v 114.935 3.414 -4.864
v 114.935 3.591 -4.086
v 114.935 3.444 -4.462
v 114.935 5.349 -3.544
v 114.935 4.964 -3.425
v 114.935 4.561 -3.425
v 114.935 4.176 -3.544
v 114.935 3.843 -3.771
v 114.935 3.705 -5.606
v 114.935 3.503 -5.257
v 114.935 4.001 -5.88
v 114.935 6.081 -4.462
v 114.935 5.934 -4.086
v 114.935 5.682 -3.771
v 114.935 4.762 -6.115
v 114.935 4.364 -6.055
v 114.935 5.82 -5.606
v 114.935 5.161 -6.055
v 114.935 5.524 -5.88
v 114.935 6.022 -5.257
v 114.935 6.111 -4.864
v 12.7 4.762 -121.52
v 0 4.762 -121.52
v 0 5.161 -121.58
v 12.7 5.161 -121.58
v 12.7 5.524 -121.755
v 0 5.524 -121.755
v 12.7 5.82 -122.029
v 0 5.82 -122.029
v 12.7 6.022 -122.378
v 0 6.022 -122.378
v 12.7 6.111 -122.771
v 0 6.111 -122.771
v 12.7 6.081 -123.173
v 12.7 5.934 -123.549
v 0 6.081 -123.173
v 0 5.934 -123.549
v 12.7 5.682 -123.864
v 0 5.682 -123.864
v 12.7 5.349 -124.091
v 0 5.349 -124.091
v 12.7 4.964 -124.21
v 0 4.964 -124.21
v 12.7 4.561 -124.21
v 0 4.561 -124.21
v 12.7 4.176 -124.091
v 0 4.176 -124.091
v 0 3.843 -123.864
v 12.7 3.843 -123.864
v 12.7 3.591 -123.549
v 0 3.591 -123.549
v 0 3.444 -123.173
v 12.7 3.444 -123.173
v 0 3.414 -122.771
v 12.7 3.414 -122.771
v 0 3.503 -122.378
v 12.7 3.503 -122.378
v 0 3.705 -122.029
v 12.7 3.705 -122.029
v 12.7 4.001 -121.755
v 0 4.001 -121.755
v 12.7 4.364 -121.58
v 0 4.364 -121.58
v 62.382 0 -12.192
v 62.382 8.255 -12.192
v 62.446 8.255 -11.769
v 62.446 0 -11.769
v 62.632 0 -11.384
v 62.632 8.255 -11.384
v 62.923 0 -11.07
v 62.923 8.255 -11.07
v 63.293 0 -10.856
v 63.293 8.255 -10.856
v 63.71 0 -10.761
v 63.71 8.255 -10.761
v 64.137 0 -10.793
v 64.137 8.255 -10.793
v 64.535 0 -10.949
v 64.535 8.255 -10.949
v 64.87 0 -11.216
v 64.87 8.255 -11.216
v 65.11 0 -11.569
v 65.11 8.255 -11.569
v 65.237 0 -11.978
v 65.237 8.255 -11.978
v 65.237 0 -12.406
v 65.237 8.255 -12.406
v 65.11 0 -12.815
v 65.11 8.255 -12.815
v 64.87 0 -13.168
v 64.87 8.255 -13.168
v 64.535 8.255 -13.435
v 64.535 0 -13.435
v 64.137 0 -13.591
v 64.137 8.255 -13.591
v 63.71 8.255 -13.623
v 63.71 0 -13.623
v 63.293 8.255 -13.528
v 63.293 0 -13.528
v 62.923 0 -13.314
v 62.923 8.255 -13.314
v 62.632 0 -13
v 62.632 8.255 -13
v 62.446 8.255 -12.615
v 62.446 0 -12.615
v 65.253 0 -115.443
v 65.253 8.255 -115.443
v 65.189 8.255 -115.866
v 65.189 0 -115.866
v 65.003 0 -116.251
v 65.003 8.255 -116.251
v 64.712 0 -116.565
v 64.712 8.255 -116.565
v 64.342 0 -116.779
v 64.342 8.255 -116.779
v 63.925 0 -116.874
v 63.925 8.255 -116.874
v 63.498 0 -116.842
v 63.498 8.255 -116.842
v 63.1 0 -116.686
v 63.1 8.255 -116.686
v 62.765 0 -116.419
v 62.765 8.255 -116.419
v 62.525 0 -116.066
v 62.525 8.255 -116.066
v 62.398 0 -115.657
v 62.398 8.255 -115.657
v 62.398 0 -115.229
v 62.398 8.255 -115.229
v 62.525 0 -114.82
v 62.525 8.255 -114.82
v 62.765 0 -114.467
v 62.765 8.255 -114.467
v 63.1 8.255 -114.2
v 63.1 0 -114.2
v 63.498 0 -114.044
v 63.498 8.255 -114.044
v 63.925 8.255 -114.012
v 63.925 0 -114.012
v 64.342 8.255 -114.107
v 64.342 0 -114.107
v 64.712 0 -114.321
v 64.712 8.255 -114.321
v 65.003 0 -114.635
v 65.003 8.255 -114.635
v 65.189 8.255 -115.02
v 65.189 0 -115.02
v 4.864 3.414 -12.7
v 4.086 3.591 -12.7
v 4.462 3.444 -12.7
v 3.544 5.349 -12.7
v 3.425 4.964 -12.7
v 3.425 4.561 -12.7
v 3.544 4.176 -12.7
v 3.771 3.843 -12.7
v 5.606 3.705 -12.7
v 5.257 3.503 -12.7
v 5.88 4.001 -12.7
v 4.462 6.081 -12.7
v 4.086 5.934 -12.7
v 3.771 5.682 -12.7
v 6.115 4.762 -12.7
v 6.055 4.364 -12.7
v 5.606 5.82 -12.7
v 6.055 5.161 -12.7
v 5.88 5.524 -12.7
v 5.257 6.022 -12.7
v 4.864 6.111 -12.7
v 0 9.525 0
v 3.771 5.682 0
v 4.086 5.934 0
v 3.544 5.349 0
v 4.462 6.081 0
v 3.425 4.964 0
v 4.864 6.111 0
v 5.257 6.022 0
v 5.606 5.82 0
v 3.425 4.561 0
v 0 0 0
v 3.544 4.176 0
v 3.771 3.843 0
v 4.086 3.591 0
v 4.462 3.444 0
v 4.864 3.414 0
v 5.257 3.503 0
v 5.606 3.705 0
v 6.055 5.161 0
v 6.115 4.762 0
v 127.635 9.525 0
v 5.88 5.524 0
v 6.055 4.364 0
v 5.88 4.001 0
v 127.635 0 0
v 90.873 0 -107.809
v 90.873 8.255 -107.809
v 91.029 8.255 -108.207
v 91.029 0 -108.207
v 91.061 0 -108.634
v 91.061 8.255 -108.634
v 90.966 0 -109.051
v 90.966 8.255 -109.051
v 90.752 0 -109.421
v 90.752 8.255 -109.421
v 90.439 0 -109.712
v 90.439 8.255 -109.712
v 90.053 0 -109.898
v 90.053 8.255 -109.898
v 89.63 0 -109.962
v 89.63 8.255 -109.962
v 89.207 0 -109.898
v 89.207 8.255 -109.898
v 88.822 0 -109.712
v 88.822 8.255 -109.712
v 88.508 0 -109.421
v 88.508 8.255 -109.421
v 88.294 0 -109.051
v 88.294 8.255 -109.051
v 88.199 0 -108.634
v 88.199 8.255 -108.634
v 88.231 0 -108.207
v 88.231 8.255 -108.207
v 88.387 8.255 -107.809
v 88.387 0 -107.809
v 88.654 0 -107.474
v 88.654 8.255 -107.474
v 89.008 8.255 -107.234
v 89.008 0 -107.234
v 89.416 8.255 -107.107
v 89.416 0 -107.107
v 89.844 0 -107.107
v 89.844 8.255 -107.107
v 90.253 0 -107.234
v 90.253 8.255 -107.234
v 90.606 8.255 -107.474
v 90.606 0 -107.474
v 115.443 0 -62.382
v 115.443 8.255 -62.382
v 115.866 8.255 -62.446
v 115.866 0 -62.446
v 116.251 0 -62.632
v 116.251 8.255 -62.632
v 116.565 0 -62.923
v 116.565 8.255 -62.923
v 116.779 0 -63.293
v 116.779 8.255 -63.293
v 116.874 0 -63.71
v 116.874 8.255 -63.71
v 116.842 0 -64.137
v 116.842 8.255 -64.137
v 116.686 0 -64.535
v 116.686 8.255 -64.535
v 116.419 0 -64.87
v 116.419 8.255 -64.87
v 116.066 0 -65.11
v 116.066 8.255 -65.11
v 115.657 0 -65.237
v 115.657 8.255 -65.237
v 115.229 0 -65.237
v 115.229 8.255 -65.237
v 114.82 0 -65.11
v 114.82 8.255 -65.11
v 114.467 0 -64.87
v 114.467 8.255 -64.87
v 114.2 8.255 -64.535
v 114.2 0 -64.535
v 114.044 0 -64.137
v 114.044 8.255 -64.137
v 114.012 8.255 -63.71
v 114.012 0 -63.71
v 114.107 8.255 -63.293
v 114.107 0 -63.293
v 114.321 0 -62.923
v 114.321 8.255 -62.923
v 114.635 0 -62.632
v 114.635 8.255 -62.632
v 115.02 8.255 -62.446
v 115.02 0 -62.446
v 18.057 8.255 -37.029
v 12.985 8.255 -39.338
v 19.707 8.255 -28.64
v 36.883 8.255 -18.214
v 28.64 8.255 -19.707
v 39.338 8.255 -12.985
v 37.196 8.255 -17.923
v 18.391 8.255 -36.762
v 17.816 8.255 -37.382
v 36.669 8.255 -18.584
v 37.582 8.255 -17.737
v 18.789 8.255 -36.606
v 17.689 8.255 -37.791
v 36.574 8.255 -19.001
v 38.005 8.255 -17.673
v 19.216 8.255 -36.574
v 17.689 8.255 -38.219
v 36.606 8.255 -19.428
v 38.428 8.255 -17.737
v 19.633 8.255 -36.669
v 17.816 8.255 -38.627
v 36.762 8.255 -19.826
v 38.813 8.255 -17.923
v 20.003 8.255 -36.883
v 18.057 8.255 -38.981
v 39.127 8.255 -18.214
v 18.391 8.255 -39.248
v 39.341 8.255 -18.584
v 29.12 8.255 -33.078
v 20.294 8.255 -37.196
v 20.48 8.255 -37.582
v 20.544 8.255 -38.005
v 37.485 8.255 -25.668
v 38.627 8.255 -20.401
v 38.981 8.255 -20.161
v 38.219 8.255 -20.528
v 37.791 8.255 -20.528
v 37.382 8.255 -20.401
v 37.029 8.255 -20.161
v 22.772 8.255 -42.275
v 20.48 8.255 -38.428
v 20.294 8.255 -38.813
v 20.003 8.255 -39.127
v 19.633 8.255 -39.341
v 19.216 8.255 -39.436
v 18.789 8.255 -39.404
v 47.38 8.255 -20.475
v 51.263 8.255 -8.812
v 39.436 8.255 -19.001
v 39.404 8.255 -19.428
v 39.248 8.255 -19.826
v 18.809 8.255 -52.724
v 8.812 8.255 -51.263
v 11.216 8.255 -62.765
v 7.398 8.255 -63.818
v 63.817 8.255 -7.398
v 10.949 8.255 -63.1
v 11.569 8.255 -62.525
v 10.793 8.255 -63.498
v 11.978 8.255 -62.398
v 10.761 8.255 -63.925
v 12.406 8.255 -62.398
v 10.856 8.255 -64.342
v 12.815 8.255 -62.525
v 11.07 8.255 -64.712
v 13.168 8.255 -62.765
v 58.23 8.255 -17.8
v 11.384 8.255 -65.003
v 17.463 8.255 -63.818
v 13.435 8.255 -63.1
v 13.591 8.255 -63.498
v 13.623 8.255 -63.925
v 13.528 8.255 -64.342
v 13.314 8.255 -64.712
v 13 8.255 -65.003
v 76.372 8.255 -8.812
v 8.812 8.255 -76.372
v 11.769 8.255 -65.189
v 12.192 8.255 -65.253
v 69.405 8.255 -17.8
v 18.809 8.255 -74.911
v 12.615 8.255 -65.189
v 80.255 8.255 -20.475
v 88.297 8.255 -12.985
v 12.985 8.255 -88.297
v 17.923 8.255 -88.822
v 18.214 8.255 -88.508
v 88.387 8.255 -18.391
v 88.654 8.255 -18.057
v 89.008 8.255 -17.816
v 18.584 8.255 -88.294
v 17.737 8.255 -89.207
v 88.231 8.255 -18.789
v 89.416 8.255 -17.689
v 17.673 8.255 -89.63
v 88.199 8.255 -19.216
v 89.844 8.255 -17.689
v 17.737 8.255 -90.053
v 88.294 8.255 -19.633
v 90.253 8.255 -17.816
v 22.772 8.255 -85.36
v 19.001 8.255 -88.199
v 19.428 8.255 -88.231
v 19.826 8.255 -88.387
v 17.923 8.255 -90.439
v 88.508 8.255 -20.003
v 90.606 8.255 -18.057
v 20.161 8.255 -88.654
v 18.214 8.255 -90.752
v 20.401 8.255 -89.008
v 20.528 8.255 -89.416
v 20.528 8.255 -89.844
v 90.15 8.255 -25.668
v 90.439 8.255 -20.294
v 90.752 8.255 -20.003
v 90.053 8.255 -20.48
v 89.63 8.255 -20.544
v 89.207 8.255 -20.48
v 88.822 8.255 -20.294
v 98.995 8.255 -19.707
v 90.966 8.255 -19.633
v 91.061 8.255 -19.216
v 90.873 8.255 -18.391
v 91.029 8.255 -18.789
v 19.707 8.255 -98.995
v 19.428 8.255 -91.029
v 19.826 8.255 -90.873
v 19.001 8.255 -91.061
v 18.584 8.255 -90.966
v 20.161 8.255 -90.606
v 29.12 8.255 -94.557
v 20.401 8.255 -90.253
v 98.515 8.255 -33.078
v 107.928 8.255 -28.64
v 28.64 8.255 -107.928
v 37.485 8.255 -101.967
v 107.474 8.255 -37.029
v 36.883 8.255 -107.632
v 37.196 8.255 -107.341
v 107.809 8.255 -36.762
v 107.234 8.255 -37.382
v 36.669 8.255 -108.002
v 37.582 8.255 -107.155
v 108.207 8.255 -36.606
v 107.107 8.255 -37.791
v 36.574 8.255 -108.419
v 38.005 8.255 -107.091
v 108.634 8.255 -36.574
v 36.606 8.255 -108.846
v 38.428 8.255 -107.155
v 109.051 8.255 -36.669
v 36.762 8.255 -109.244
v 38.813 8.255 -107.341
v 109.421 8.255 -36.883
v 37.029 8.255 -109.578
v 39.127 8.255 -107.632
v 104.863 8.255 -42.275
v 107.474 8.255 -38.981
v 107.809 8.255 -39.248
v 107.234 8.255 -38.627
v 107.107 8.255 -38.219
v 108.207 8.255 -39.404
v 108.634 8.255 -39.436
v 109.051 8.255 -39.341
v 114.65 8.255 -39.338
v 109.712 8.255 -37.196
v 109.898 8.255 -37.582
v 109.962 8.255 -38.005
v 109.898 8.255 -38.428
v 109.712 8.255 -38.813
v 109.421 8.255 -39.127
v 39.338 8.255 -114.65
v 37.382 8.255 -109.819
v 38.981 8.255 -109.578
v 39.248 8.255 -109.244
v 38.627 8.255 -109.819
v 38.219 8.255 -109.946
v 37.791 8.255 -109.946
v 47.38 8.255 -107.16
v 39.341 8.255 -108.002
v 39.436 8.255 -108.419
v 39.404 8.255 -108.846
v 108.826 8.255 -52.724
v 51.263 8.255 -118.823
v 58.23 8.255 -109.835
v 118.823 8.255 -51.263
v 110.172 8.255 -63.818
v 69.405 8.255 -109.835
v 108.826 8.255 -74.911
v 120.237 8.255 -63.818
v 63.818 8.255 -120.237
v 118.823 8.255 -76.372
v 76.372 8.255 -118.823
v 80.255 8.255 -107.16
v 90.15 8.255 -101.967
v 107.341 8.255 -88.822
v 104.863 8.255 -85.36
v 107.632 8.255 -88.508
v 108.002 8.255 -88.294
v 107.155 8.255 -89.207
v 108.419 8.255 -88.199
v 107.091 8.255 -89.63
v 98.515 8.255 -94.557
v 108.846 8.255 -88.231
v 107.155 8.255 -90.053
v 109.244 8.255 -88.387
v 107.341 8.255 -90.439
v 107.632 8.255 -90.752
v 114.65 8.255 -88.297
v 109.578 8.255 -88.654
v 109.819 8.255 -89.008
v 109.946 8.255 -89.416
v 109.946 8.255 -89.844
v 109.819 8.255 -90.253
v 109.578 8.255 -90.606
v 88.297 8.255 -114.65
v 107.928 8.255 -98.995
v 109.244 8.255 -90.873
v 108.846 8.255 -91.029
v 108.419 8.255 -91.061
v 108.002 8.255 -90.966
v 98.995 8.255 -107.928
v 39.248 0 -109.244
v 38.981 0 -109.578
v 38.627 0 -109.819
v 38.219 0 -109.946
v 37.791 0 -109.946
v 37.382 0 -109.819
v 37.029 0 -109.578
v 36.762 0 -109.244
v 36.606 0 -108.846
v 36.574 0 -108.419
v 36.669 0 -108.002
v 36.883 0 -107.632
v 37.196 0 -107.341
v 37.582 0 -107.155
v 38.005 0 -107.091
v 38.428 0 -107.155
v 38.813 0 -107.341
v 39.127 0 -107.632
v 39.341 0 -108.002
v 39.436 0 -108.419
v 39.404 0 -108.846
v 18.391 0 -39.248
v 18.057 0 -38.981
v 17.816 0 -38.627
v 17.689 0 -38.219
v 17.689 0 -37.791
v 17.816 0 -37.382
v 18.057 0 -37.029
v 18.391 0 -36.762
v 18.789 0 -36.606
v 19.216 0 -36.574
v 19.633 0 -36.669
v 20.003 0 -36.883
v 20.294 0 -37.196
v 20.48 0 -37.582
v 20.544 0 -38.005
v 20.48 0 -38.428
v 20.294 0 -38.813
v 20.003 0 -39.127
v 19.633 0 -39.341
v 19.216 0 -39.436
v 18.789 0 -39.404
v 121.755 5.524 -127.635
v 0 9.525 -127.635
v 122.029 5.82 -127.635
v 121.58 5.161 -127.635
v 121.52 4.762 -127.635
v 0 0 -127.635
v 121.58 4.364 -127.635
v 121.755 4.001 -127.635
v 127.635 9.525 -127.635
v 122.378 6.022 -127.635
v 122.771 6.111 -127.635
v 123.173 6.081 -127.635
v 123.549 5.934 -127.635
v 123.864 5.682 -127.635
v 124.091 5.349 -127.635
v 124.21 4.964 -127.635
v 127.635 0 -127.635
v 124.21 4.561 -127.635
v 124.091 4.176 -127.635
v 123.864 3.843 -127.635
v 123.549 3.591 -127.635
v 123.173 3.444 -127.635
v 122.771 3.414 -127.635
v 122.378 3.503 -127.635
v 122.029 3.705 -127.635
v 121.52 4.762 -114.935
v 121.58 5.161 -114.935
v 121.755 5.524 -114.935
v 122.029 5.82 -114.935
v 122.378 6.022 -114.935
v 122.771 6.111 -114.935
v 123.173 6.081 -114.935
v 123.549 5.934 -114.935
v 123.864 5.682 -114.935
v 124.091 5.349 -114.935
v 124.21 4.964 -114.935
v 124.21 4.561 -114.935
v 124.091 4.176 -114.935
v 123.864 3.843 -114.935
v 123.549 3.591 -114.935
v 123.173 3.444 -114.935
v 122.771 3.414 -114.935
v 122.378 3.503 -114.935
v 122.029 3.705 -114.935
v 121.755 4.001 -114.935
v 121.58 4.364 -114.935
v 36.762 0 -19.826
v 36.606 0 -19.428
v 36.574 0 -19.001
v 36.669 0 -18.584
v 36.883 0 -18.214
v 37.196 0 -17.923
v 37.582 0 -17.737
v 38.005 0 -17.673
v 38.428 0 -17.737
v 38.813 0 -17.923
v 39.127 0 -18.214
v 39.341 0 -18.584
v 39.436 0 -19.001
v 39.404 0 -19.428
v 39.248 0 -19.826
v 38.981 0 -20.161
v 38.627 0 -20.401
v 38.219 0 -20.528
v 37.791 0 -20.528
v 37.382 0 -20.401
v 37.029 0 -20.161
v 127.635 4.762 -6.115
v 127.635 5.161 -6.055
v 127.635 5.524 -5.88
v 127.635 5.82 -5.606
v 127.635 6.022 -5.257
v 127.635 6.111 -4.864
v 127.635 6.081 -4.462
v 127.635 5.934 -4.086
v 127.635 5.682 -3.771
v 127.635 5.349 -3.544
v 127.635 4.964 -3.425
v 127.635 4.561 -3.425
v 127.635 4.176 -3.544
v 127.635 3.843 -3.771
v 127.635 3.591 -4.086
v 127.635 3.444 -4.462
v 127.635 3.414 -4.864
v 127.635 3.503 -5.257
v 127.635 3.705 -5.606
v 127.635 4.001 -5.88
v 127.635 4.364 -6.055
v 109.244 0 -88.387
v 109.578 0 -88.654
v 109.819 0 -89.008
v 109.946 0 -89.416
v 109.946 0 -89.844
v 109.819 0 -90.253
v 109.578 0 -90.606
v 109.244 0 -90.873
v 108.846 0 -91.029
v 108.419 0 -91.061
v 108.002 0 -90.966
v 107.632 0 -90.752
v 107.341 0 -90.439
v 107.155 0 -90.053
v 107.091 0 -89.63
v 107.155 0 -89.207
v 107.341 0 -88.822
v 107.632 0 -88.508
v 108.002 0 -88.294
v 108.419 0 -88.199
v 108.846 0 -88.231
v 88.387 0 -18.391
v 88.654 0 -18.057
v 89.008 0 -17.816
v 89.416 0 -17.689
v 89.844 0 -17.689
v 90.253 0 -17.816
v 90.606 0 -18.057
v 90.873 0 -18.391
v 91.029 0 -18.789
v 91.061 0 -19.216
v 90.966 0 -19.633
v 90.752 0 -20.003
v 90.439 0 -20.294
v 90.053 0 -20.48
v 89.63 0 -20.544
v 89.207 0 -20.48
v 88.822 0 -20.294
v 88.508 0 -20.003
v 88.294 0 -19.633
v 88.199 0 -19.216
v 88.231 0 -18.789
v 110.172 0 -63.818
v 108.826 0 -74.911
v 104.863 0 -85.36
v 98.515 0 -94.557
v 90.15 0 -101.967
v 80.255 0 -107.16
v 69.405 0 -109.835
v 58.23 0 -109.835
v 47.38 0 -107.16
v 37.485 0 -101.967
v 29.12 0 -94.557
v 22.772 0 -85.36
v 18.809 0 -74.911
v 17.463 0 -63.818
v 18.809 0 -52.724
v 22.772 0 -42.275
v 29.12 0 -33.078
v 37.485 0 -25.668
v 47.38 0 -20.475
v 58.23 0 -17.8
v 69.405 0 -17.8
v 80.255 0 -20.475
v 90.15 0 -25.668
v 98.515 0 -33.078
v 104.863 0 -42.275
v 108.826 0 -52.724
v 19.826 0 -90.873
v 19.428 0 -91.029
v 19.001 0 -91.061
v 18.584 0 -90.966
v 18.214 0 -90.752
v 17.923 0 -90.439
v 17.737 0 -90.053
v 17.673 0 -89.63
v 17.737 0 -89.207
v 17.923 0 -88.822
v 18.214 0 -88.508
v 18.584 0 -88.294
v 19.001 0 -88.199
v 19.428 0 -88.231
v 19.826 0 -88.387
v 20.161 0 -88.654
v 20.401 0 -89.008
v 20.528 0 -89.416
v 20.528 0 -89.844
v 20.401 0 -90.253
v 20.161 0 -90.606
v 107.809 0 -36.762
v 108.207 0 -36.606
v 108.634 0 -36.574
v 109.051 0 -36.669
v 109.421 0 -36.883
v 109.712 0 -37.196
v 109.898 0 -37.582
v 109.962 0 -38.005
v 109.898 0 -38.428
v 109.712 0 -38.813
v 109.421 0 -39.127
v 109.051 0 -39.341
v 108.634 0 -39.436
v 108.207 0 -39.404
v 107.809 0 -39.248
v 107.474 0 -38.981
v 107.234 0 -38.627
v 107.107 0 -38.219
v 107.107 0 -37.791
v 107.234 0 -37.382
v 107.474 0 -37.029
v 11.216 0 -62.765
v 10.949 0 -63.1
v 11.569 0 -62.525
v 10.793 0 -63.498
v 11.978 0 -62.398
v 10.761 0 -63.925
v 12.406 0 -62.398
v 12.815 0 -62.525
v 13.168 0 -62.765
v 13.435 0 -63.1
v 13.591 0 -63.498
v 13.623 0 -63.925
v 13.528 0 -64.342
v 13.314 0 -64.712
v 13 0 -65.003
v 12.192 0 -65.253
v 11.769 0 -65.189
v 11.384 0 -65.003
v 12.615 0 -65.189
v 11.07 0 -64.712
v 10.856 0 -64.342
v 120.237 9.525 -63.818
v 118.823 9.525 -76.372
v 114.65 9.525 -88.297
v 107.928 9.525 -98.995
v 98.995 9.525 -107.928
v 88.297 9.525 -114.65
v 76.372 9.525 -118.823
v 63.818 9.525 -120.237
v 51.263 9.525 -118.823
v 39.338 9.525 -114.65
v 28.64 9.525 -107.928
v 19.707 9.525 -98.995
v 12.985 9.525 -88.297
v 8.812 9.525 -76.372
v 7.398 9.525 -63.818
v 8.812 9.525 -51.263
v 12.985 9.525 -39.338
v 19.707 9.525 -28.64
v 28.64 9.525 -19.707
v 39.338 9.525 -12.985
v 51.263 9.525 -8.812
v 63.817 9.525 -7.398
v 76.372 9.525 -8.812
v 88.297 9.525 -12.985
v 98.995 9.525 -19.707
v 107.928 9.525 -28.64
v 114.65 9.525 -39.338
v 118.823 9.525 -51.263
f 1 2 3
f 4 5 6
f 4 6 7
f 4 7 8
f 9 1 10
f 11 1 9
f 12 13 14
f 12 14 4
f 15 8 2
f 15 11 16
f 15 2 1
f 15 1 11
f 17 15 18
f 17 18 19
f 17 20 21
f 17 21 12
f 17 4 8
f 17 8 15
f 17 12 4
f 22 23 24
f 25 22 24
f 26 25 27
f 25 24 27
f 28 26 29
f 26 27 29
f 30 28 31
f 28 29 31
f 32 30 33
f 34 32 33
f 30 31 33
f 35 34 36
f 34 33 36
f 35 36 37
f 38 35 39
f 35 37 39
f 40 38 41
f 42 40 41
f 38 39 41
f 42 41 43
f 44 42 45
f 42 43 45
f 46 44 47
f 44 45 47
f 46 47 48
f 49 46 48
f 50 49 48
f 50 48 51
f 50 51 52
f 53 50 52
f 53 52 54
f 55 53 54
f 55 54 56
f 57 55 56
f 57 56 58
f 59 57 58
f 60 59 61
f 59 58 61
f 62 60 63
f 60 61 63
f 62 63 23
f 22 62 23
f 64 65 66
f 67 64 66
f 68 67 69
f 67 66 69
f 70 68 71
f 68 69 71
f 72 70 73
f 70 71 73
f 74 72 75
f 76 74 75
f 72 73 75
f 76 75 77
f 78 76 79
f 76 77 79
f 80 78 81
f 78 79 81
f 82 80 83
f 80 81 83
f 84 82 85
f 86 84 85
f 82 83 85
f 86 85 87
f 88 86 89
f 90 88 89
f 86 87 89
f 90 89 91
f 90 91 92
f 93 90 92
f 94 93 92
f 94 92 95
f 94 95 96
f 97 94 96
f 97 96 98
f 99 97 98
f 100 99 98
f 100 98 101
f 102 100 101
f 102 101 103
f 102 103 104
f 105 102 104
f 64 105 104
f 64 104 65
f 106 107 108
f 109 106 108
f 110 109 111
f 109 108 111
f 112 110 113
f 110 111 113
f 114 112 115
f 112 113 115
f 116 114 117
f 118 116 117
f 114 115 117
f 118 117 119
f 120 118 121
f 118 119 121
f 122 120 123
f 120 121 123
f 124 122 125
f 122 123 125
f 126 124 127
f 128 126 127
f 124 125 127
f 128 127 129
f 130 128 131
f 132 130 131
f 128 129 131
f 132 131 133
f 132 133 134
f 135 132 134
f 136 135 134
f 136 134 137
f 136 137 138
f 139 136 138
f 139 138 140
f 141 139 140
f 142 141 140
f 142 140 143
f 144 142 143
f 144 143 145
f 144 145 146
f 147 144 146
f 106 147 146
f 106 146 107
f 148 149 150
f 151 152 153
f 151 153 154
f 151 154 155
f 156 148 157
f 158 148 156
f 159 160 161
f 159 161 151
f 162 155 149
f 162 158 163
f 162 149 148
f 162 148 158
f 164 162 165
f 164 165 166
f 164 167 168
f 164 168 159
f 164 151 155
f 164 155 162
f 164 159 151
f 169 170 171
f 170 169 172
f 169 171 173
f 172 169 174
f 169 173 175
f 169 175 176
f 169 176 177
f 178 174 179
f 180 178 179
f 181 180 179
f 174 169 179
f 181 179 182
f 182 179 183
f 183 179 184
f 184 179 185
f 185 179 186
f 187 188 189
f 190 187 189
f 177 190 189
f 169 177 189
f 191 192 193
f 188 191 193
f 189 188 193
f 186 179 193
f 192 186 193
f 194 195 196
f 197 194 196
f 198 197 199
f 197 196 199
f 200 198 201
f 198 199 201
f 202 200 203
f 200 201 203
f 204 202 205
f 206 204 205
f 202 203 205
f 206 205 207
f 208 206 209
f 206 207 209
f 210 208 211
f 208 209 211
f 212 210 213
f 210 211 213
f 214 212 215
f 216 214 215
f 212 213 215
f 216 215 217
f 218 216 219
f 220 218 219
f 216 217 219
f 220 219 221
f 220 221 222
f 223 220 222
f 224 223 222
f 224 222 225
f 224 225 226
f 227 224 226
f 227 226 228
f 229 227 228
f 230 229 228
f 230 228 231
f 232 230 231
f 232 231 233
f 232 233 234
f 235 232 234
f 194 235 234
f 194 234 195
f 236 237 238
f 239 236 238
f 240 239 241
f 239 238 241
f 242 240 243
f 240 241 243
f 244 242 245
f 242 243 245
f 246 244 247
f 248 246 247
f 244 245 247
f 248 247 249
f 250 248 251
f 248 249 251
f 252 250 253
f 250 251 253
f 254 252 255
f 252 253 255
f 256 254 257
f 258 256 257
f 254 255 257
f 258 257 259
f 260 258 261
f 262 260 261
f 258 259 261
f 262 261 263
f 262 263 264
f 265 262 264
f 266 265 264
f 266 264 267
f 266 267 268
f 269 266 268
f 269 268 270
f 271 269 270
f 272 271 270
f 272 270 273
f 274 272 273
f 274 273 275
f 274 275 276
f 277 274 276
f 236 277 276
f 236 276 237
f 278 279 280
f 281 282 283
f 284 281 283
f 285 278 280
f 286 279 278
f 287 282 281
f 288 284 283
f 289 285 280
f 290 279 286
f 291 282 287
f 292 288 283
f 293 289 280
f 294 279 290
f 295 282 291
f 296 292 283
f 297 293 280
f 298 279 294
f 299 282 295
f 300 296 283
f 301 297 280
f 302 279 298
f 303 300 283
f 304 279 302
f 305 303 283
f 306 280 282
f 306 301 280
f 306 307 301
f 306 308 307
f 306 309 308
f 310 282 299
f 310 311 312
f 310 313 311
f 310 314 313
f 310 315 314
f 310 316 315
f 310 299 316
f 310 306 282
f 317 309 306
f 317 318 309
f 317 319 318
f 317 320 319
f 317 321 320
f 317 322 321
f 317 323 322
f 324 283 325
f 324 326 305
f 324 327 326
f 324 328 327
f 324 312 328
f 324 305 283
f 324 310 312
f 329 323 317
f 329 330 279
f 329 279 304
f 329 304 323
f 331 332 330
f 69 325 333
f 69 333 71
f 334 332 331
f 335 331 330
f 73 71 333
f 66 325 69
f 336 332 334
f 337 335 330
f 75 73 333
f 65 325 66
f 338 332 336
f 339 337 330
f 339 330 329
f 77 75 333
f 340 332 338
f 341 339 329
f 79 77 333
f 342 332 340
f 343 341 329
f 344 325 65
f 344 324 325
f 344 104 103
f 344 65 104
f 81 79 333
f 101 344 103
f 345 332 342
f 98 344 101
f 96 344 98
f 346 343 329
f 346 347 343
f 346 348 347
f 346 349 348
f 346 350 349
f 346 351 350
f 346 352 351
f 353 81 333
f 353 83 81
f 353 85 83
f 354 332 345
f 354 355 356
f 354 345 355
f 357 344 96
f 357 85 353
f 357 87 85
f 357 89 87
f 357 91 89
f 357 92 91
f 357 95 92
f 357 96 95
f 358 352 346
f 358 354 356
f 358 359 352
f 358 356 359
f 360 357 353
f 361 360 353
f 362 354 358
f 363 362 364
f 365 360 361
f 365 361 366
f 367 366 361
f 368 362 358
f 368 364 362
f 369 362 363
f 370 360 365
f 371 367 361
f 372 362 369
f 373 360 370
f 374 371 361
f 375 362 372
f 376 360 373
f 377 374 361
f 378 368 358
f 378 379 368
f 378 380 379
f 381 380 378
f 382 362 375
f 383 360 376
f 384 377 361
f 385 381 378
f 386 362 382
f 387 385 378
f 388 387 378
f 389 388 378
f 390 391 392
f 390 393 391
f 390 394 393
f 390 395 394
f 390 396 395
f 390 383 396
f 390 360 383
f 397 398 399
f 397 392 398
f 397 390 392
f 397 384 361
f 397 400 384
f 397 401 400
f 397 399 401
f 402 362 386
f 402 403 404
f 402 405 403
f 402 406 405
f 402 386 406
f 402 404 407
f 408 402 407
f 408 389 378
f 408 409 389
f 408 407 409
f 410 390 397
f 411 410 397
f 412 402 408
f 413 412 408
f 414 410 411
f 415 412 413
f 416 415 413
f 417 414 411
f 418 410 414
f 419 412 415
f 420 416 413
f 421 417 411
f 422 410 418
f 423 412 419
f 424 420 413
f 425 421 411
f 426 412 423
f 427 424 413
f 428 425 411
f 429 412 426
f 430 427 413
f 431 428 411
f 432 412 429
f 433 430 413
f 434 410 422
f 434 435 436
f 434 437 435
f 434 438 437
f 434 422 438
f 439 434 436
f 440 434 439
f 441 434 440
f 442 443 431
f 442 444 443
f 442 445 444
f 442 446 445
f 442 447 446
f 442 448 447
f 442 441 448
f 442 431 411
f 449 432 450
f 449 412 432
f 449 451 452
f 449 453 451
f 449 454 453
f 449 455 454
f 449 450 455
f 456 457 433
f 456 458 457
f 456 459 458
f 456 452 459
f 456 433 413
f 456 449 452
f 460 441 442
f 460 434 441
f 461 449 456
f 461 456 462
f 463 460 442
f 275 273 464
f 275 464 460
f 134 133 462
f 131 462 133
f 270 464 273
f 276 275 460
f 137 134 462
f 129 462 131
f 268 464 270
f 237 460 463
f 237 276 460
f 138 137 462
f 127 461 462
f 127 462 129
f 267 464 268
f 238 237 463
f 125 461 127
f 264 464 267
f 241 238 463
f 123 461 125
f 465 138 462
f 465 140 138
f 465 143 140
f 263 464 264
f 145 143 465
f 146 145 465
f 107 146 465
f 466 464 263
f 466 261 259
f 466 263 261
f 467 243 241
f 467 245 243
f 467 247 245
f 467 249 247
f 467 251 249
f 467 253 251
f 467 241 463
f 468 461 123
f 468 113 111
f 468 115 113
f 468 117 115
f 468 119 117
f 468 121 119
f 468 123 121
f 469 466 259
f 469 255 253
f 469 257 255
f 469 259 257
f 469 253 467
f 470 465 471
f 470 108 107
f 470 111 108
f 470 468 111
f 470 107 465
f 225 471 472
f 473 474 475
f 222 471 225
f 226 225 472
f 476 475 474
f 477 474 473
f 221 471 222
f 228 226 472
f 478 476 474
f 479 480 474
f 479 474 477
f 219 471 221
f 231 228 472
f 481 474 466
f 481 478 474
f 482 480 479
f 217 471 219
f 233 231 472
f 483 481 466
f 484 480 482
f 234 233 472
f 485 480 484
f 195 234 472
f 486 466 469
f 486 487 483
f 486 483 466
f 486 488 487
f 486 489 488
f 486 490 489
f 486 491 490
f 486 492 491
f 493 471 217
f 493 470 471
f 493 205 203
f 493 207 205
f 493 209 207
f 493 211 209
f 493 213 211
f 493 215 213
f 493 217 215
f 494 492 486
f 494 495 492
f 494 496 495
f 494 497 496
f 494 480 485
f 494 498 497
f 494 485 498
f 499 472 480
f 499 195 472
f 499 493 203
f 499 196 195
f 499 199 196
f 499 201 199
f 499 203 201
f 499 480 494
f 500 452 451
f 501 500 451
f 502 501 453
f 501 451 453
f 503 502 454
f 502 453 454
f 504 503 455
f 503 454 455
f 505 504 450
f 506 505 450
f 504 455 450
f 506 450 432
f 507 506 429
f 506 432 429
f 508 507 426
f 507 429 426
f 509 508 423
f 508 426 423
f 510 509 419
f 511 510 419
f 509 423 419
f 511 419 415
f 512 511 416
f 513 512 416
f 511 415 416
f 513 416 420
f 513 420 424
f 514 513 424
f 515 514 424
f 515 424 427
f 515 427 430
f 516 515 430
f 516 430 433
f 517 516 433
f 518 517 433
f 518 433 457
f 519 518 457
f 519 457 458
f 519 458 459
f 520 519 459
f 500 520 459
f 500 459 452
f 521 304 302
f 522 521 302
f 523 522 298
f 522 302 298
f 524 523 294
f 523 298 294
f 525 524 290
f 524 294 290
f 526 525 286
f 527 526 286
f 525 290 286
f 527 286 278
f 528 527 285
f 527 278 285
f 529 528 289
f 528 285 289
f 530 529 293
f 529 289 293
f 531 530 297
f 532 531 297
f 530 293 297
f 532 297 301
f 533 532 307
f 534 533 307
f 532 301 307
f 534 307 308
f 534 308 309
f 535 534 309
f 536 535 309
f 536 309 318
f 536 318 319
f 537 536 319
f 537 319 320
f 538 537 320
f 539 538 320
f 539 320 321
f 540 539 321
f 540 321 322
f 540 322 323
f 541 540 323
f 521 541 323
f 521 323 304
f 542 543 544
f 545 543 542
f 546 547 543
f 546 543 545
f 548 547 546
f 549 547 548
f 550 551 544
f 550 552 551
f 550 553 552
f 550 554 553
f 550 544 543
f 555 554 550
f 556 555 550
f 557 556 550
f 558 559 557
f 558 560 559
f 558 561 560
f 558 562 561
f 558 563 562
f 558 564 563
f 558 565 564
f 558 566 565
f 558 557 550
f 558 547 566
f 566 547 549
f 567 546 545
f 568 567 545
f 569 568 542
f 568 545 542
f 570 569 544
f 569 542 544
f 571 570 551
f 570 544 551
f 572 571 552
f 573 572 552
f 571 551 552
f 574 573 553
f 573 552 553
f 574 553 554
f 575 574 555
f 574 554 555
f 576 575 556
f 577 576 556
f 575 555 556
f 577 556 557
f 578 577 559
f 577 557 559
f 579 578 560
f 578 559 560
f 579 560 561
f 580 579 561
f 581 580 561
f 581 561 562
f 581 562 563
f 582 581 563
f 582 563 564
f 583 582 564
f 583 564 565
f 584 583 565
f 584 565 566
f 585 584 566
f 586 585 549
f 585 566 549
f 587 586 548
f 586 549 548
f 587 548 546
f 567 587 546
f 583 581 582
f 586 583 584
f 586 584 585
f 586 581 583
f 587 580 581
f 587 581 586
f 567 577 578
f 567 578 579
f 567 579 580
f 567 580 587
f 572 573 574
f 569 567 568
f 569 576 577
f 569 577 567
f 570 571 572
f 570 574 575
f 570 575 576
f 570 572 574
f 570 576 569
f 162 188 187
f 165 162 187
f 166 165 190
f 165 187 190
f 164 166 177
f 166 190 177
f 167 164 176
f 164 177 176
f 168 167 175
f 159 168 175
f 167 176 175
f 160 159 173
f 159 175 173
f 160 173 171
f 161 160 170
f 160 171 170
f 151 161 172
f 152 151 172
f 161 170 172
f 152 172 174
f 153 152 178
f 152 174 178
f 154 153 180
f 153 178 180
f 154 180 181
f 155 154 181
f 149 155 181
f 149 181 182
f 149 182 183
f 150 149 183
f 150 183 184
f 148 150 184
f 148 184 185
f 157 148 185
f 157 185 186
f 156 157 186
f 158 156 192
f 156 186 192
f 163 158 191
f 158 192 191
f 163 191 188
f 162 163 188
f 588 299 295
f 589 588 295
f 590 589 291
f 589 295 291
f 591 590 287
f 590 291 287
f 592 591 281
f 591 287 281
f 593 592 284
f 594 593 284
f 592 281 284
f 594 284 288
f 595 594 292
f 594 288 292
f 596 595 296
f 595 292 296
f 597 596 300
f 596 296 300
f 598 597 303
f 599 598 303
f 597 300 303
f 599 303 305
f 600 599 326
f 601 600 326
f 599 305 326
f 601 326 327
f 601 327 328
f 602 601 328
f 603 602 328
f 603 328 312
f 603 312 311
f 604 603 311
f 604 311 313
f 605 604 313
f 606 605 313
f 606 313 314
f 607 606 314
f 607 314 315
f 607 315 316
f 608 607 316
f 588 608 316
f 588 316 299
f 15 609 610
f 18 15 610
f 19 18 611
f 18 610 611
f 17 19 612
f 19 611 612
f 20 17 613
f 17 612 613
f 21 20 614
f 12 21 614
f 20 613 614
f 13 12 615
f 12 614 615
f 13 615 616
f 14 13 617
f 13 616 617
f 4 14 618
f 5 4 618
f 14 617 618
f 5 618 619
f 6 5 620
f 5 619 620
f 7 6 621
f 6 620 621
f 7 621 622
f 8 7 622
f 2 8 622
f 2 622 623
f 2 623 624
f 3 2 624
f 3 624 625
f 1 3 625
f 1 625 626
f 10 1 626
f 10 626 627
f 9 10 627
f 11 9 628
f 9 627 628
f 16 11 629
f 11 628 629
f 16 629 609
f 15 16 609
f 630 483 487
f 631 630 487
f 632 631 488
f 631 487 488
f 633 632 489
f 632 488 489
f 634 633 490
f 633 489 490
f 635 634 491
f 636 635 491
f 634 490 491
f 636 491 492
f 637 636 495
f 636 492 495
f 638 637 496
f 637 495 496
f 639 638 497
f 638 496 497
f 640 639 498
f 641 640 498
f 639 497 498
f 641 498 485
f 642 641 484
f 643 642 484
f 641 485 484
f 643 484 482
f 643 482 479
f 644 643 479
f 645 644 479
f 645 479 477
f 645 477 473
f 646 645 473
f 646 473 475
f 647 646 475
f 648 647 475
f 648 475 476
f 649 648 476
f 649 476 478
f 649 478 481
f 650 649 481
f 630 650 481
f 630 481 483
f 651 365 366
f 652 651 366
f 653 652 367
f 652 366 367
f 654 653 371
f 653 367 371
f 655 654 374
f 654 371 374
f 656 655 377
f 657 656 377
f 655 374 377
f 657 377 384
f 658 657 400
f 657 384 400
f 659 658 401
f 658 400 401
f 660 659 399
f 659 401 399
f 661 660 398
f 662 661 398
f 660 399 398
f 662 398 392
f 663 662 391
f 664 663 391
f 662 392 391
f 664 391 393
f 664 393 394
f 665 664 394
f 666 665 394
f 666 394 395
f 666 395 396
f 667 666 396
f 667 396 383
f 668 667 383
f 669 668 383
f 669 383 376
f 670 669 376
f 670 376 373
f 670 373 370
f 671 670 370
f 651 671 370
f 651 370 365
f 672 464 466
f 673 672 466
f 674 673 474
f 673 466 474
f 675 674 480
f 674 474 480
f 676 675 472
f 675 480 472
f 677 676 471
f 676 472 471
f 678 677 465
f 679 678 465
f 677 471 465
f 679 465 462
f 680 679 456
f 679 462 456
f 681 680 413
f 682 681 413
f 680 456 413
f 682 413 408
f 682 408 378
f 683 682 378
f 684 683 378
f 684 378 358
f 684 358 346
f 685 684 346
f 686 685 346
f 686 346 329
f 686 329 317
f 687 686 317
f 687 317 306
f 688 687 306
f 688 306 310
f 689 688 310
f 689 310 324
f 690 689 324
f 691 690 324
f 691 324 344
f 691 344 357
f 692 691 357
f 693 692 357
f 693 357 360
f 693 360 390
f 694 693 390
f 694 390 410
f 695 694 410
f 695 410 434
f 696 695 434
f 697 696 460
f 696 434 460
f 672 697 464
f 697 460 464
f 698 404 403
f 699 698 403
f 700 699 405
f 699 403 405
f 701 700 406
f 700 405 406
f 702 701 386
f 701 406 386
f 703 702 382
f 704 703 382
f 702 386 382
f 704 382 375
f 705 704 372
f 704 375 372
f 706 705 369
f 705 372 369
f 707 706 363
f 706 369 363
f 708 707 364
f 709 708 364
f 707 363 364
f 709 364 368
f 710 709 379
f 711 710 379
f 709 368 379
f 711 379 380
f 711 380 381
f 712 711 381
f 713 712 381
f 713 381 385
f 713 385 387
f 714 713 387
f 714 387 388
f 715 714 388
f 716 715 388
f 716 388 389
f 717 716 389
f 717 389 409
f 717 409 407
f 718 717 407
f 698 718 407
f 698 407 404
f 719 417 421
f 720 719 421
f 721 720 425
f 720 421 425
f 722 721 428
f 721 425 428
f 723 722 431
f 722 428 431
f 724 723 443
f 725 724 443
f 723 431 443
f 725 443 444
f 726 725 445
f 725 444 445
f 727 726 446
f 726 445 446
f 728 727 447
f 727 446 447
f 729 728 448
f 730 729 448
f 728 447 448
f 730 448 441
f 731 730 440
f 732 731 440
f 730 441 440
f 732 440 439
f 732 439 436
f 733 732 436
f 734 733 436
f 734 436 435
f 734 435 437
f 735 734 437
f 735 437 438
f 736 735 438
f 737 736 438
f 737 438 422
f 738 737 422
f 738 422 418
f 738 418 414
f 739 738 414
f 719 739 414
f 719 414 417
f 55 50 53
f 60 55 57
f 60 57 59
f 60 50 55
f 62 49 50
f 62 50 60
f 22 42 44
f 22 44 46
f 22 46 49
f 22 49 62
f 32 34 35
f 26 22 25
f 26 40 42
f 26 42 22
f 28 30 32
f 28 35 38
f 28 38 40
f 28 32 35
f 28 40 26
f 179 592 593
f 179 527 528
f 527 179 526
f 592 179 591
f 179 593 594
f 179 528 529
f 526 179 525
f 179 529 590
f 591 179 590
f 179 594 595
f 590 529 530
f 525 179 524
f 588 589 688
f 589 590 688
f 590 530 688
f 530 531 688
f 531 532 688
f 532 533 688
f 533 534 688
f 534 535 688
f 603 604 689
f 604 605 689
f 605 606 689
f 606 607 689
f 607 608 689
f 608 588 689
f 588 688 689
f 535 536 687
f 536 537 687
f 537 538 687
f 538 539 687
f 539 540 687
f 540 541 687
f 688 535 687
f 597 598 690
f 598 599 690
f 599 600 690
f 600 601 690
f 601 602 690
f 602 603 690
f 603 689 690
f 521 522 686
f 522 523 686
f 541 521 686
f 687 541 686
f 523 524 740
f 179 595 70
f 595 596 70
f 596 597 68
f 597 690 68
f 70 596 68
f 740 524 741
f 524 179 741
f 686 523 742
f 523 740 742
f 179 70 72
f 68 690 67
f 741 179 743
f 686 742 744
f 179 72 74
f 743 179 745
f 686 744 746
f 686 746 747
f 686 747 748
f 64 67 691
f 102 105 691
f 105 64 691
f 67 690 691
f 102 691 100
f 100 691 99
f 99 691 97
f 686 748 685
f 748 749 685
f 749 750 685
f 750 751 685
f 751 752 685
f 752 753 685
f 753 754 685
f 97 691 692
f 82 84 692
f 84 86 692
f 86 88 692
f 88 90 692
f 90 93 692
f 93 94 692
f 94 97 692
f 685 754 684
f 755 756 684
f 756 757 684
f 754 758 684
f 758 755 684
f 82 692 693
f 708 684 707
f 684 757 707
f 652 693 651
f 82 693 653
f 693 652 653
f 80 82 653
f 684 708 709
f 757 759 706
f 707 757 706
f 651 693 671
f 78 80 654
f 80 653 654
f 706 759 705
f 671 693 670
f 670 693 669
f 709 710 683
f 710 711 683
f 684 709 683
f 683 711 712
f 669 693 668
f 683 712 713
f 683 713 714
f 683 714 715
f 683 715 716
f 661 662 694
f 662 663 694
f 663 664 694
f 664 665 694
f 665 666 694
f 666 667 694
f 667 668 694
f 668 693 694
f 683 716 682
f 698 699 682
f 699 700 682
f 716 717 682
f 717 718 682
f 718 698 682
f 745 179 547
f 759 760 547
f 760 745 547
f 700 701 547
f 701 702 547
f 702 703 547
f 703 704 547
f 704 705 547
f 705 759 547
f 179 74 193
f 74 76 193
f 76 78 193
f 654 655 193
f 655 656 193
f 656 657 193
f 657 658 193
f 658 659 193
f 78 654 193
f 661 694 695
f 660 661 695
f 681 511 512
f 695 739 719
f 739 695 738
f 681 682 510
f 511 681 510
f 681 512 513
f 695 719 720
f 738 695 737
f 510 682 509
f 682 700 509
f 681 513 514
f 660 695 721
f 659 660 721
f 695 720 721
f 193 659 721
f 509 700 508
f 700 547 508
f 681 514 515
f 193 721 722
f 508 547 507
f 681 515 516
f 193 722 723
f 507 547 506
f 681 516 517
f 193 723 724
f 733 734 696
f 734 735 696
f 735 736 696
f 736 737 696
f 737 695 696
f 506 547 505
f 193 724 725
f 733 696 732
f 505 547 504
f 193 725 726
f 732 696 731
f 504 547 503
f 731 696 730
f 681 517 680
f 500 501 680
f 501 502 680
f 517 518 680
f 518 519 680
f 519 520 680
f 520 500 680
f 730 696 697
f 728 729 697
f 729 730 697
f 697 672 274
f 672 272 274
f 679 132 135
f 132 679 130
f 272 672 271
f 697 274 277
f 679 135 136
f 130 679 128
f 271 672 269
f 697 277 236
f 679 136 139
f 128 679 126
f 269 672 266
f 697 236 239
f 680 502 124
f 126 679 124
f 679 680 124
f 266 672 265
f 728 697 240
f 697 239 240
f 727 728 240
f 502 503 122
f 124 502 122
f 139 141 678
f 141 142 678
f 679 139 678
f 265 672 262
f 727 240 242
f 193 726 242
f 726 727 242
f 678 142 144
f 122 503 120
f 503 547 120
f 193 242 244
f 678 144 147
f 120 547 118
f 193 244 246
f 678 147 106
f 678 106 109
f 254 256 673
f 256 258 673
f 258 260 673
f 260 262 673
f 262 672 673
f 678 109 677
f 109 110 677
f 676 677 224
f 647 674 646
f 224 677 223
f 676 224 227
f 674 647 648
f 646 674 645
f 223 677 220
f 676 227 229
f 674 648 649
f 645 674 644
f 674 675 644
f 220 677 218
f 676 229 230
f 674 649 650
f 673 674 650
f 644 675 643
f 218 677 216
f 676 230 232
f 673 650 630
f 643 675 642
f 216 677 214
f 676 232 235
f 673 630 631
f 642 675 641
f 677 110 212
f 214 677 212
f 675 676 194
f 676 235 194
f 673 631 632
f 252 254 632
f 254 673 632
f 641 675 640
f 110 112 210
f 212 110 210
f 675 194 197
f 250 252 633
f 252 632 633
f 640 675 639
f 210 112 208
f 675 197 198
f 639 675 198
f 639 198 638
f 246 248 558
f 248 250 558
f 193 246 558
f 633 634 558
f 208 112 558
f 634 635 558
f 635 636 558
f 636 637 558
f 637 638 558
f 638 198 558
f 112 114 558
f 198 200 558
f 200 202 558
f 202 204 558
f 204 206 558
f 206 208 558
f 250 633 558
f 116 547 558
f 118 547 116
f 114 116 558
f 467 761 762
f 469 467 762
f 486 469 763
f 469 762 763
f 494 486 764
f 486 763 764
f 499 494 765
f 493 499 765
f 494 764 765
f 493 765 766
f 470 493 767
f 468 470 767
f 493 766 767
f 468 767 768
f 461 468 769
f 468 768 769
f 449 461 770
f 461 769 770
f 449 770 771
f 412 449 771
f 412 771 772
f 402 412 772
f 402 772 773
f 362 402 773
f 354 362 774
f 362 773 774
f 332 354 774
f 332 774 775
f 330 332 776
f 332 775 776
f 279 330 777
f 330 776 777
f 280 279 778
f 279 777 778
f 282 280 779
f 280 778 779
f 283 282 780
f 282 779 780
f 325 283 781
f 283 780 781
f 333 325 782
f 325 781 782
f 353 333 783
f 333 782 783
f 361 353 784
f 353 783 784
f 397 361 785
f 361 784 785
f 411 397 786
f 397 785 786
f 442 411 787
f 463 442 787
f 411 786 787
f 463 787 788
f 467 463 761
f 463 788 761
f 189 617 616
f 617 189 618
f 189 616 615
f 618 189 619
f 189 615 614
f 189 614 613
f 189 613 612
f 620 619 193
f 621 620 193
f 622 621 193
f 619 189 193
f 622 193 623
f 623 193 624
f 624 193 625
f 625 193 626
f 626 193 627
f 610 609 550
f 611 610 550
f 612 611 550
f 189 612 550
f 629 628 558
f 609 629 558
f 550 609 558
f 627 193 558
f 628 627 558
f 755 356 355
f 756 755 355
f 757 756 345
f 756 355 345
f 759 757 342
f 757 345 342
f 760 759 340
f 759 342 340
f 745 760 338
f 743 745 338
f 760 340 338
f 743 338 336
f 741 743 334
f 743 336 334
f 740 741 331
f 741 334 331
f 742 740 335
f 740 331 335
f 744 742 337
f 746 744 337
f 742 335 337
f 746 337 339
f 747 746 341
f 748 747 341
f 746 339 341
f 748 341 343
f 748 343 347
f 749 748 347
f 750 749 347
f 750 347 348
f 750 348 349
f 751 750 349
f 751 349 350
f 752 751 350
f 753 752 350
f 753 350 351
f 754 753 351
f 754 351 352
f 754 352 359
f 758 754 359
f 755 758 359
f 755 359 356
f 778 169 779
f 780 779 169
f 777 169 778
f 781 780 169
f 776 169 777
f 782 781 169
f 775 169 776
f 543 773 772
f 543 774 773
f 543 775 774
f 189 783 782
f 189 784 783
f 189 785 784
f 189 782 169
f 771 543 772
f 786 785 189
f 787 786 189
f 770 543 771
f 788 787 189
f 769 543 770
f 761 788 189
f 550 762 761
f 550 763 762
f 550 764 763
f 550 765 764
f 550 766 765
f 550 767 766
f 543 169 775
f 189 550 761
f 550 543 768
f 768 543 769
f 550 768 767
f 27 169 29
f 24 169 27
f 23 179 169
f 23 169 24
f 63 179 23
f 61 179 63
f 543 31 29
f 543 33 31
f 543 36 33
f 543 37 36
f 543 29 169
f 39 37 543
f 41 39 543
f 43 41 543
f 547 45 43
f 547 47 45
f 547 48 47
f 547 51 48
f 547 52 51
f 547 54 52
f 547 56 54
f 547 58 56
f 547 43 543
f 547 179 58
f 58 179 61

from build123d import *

# Parameters (mm, degrees)
SKETCH1_W           = 127.635
SKETCH1_H           = 127.635
BOSS_EXTRUDE1_DEPTH = 9.525
SKETCH6_R           = 1.35255
F_6_32_HOLE1_DEPTH  = 12.7
SKETCH7_R           = 1.35255
F_6_32_HOLE2_DEPTH  = 12.7
SKETCH8_R           = 1.35255
F_6_32_HOLE3_DEPTH  = 12.7
SKETCH9_R           = 1.35255
F_6_32_HOLE4_DEPTH  = 12.7
SKETCH5_R           = 46.355
CUT_EXTRUDE1_DEPTH  = 9.525
SKETCH11_R          = 1.4351
CUT_EXTRUDE3_DEPTH  = 10.525
CIRPATTERN1_COUNT   = 12
SKETCH12_R          = 56.41975
CUT_EXTRUDE4_DEPTH  = 1.27


with BuildPart() as part:
    # Sketch1 → Boss-Extrude1 (new body)
    with BuildSketch(Plane(origin=(0, 0, 0), x_dir=(1, 0, 0), z_dir=(0, 1, 0))):
        with Locations((63.8175, 63.8175)):
            Rectangle(SKETCH1_W, SKETCH1_H)
    extrude(amount=BOSS_EXTRUDE1_DEPTH)

    # Sketch6 → 6-32 hole1 (cut)
    with BuildSketch(Plane(origin=(127.635, 0, 0), x_dir=(0, 0, -1), z_dir=(1, 0, 0))):
        with Locations((4.7625, 4.7625)):
            Circle(SKETCH6_R)
    extrude(amount=-F_6_32_HOLE1_DEPTH, mode=Mode.SUBTRACT)

    # Sketch7 → 6-32 hole2 (cut)
    with BuildSketch(Plane(origin=(0, 0, -127.635), x_dir=(-1, 0, 0), z_dir=(0, 0, -1))):
        with Locations((-122.8725, 4.7625)):
            Circle(SKETCH7_R)
    extrude(amount=-F_6_32_HOLE2_DEPTH, mode=Mode.SUBTRACT)

    # Sketch8 → 6-32 hole3 (cut)
    with BuildSketch(Plane.ZY):
        with Locations((-122.8725, 4.7625)):
            Circle(SKETCH8_R)
    extrude(amount=-F_6_32_HOLE3_DEPTH, mode=Mode.SUBTRACT)

    # Sketch9 → 6-32 hole4 (cut)
    with BuildSketch(Plane.XY):
        with Locations((4.7625, 4.7625)):
            Circle(SKETCH9_R)
    extrude(amount=-F_6_32_HOLE4_DEPTH, mode=Mode.SUBTRACT)

    # Sketch5 → Cut-Extrude1 (cut)
    with BuildSketch(Plane(origin=(0, 9.525, 0), x_dir=(1, 0, 0), z_dir=(0, 1, 0))):
        with Locations((63.8175, 63.8175)):
            Circle(SKETCH5_R)
    extrude(amount=-CUT_EXTRUDE1_DEPTH, mode=Mode.SUBTRACT)

    # Sketch11 → Cut-Extrude3 (cut, through all)
    with BuildSketch(Plane(origin=(0, 9.525, 0), x_dir=(1, 0, 0), z_dir=(0, 1, 0))):
        with Locations((63.8175, 115.443)):
            Circle(SKETCH11_R)
    cut_extrude3 = extrude(amount=-CUT_EXTRUDE3_DEPTH, mode=Mode.SUBTRACT)

    # CirPattern1: Cut-Extrude3 ×12 about axis
    cirpattern1_axis = Axis((63.8175, 0, -63.8175), (0, 1, 0))
    for i in range(1, CIRPATTERN1_COUNT):
        add(cut_extrude3.rotate(cirpattern1_axis, i * 360 / CIRPATTERN1_COUNT), mode=Mode.SUBTRACT)

    # Sketch12 → Cut-Extrude4 (cut)
    with BuildSketch(Plane(origin=(0, 9.525, 0), x_dir=(1, 0, 0), z_dir=(0, 1, 0))):
        with Locations((63.8175, 63.8175)):
            Circle(SKETCH12_R)
    extrude(amount=-CUT_EXTRUDE4_DEPTH, mode=Mode.SUBTRACT)


solid = part.part
